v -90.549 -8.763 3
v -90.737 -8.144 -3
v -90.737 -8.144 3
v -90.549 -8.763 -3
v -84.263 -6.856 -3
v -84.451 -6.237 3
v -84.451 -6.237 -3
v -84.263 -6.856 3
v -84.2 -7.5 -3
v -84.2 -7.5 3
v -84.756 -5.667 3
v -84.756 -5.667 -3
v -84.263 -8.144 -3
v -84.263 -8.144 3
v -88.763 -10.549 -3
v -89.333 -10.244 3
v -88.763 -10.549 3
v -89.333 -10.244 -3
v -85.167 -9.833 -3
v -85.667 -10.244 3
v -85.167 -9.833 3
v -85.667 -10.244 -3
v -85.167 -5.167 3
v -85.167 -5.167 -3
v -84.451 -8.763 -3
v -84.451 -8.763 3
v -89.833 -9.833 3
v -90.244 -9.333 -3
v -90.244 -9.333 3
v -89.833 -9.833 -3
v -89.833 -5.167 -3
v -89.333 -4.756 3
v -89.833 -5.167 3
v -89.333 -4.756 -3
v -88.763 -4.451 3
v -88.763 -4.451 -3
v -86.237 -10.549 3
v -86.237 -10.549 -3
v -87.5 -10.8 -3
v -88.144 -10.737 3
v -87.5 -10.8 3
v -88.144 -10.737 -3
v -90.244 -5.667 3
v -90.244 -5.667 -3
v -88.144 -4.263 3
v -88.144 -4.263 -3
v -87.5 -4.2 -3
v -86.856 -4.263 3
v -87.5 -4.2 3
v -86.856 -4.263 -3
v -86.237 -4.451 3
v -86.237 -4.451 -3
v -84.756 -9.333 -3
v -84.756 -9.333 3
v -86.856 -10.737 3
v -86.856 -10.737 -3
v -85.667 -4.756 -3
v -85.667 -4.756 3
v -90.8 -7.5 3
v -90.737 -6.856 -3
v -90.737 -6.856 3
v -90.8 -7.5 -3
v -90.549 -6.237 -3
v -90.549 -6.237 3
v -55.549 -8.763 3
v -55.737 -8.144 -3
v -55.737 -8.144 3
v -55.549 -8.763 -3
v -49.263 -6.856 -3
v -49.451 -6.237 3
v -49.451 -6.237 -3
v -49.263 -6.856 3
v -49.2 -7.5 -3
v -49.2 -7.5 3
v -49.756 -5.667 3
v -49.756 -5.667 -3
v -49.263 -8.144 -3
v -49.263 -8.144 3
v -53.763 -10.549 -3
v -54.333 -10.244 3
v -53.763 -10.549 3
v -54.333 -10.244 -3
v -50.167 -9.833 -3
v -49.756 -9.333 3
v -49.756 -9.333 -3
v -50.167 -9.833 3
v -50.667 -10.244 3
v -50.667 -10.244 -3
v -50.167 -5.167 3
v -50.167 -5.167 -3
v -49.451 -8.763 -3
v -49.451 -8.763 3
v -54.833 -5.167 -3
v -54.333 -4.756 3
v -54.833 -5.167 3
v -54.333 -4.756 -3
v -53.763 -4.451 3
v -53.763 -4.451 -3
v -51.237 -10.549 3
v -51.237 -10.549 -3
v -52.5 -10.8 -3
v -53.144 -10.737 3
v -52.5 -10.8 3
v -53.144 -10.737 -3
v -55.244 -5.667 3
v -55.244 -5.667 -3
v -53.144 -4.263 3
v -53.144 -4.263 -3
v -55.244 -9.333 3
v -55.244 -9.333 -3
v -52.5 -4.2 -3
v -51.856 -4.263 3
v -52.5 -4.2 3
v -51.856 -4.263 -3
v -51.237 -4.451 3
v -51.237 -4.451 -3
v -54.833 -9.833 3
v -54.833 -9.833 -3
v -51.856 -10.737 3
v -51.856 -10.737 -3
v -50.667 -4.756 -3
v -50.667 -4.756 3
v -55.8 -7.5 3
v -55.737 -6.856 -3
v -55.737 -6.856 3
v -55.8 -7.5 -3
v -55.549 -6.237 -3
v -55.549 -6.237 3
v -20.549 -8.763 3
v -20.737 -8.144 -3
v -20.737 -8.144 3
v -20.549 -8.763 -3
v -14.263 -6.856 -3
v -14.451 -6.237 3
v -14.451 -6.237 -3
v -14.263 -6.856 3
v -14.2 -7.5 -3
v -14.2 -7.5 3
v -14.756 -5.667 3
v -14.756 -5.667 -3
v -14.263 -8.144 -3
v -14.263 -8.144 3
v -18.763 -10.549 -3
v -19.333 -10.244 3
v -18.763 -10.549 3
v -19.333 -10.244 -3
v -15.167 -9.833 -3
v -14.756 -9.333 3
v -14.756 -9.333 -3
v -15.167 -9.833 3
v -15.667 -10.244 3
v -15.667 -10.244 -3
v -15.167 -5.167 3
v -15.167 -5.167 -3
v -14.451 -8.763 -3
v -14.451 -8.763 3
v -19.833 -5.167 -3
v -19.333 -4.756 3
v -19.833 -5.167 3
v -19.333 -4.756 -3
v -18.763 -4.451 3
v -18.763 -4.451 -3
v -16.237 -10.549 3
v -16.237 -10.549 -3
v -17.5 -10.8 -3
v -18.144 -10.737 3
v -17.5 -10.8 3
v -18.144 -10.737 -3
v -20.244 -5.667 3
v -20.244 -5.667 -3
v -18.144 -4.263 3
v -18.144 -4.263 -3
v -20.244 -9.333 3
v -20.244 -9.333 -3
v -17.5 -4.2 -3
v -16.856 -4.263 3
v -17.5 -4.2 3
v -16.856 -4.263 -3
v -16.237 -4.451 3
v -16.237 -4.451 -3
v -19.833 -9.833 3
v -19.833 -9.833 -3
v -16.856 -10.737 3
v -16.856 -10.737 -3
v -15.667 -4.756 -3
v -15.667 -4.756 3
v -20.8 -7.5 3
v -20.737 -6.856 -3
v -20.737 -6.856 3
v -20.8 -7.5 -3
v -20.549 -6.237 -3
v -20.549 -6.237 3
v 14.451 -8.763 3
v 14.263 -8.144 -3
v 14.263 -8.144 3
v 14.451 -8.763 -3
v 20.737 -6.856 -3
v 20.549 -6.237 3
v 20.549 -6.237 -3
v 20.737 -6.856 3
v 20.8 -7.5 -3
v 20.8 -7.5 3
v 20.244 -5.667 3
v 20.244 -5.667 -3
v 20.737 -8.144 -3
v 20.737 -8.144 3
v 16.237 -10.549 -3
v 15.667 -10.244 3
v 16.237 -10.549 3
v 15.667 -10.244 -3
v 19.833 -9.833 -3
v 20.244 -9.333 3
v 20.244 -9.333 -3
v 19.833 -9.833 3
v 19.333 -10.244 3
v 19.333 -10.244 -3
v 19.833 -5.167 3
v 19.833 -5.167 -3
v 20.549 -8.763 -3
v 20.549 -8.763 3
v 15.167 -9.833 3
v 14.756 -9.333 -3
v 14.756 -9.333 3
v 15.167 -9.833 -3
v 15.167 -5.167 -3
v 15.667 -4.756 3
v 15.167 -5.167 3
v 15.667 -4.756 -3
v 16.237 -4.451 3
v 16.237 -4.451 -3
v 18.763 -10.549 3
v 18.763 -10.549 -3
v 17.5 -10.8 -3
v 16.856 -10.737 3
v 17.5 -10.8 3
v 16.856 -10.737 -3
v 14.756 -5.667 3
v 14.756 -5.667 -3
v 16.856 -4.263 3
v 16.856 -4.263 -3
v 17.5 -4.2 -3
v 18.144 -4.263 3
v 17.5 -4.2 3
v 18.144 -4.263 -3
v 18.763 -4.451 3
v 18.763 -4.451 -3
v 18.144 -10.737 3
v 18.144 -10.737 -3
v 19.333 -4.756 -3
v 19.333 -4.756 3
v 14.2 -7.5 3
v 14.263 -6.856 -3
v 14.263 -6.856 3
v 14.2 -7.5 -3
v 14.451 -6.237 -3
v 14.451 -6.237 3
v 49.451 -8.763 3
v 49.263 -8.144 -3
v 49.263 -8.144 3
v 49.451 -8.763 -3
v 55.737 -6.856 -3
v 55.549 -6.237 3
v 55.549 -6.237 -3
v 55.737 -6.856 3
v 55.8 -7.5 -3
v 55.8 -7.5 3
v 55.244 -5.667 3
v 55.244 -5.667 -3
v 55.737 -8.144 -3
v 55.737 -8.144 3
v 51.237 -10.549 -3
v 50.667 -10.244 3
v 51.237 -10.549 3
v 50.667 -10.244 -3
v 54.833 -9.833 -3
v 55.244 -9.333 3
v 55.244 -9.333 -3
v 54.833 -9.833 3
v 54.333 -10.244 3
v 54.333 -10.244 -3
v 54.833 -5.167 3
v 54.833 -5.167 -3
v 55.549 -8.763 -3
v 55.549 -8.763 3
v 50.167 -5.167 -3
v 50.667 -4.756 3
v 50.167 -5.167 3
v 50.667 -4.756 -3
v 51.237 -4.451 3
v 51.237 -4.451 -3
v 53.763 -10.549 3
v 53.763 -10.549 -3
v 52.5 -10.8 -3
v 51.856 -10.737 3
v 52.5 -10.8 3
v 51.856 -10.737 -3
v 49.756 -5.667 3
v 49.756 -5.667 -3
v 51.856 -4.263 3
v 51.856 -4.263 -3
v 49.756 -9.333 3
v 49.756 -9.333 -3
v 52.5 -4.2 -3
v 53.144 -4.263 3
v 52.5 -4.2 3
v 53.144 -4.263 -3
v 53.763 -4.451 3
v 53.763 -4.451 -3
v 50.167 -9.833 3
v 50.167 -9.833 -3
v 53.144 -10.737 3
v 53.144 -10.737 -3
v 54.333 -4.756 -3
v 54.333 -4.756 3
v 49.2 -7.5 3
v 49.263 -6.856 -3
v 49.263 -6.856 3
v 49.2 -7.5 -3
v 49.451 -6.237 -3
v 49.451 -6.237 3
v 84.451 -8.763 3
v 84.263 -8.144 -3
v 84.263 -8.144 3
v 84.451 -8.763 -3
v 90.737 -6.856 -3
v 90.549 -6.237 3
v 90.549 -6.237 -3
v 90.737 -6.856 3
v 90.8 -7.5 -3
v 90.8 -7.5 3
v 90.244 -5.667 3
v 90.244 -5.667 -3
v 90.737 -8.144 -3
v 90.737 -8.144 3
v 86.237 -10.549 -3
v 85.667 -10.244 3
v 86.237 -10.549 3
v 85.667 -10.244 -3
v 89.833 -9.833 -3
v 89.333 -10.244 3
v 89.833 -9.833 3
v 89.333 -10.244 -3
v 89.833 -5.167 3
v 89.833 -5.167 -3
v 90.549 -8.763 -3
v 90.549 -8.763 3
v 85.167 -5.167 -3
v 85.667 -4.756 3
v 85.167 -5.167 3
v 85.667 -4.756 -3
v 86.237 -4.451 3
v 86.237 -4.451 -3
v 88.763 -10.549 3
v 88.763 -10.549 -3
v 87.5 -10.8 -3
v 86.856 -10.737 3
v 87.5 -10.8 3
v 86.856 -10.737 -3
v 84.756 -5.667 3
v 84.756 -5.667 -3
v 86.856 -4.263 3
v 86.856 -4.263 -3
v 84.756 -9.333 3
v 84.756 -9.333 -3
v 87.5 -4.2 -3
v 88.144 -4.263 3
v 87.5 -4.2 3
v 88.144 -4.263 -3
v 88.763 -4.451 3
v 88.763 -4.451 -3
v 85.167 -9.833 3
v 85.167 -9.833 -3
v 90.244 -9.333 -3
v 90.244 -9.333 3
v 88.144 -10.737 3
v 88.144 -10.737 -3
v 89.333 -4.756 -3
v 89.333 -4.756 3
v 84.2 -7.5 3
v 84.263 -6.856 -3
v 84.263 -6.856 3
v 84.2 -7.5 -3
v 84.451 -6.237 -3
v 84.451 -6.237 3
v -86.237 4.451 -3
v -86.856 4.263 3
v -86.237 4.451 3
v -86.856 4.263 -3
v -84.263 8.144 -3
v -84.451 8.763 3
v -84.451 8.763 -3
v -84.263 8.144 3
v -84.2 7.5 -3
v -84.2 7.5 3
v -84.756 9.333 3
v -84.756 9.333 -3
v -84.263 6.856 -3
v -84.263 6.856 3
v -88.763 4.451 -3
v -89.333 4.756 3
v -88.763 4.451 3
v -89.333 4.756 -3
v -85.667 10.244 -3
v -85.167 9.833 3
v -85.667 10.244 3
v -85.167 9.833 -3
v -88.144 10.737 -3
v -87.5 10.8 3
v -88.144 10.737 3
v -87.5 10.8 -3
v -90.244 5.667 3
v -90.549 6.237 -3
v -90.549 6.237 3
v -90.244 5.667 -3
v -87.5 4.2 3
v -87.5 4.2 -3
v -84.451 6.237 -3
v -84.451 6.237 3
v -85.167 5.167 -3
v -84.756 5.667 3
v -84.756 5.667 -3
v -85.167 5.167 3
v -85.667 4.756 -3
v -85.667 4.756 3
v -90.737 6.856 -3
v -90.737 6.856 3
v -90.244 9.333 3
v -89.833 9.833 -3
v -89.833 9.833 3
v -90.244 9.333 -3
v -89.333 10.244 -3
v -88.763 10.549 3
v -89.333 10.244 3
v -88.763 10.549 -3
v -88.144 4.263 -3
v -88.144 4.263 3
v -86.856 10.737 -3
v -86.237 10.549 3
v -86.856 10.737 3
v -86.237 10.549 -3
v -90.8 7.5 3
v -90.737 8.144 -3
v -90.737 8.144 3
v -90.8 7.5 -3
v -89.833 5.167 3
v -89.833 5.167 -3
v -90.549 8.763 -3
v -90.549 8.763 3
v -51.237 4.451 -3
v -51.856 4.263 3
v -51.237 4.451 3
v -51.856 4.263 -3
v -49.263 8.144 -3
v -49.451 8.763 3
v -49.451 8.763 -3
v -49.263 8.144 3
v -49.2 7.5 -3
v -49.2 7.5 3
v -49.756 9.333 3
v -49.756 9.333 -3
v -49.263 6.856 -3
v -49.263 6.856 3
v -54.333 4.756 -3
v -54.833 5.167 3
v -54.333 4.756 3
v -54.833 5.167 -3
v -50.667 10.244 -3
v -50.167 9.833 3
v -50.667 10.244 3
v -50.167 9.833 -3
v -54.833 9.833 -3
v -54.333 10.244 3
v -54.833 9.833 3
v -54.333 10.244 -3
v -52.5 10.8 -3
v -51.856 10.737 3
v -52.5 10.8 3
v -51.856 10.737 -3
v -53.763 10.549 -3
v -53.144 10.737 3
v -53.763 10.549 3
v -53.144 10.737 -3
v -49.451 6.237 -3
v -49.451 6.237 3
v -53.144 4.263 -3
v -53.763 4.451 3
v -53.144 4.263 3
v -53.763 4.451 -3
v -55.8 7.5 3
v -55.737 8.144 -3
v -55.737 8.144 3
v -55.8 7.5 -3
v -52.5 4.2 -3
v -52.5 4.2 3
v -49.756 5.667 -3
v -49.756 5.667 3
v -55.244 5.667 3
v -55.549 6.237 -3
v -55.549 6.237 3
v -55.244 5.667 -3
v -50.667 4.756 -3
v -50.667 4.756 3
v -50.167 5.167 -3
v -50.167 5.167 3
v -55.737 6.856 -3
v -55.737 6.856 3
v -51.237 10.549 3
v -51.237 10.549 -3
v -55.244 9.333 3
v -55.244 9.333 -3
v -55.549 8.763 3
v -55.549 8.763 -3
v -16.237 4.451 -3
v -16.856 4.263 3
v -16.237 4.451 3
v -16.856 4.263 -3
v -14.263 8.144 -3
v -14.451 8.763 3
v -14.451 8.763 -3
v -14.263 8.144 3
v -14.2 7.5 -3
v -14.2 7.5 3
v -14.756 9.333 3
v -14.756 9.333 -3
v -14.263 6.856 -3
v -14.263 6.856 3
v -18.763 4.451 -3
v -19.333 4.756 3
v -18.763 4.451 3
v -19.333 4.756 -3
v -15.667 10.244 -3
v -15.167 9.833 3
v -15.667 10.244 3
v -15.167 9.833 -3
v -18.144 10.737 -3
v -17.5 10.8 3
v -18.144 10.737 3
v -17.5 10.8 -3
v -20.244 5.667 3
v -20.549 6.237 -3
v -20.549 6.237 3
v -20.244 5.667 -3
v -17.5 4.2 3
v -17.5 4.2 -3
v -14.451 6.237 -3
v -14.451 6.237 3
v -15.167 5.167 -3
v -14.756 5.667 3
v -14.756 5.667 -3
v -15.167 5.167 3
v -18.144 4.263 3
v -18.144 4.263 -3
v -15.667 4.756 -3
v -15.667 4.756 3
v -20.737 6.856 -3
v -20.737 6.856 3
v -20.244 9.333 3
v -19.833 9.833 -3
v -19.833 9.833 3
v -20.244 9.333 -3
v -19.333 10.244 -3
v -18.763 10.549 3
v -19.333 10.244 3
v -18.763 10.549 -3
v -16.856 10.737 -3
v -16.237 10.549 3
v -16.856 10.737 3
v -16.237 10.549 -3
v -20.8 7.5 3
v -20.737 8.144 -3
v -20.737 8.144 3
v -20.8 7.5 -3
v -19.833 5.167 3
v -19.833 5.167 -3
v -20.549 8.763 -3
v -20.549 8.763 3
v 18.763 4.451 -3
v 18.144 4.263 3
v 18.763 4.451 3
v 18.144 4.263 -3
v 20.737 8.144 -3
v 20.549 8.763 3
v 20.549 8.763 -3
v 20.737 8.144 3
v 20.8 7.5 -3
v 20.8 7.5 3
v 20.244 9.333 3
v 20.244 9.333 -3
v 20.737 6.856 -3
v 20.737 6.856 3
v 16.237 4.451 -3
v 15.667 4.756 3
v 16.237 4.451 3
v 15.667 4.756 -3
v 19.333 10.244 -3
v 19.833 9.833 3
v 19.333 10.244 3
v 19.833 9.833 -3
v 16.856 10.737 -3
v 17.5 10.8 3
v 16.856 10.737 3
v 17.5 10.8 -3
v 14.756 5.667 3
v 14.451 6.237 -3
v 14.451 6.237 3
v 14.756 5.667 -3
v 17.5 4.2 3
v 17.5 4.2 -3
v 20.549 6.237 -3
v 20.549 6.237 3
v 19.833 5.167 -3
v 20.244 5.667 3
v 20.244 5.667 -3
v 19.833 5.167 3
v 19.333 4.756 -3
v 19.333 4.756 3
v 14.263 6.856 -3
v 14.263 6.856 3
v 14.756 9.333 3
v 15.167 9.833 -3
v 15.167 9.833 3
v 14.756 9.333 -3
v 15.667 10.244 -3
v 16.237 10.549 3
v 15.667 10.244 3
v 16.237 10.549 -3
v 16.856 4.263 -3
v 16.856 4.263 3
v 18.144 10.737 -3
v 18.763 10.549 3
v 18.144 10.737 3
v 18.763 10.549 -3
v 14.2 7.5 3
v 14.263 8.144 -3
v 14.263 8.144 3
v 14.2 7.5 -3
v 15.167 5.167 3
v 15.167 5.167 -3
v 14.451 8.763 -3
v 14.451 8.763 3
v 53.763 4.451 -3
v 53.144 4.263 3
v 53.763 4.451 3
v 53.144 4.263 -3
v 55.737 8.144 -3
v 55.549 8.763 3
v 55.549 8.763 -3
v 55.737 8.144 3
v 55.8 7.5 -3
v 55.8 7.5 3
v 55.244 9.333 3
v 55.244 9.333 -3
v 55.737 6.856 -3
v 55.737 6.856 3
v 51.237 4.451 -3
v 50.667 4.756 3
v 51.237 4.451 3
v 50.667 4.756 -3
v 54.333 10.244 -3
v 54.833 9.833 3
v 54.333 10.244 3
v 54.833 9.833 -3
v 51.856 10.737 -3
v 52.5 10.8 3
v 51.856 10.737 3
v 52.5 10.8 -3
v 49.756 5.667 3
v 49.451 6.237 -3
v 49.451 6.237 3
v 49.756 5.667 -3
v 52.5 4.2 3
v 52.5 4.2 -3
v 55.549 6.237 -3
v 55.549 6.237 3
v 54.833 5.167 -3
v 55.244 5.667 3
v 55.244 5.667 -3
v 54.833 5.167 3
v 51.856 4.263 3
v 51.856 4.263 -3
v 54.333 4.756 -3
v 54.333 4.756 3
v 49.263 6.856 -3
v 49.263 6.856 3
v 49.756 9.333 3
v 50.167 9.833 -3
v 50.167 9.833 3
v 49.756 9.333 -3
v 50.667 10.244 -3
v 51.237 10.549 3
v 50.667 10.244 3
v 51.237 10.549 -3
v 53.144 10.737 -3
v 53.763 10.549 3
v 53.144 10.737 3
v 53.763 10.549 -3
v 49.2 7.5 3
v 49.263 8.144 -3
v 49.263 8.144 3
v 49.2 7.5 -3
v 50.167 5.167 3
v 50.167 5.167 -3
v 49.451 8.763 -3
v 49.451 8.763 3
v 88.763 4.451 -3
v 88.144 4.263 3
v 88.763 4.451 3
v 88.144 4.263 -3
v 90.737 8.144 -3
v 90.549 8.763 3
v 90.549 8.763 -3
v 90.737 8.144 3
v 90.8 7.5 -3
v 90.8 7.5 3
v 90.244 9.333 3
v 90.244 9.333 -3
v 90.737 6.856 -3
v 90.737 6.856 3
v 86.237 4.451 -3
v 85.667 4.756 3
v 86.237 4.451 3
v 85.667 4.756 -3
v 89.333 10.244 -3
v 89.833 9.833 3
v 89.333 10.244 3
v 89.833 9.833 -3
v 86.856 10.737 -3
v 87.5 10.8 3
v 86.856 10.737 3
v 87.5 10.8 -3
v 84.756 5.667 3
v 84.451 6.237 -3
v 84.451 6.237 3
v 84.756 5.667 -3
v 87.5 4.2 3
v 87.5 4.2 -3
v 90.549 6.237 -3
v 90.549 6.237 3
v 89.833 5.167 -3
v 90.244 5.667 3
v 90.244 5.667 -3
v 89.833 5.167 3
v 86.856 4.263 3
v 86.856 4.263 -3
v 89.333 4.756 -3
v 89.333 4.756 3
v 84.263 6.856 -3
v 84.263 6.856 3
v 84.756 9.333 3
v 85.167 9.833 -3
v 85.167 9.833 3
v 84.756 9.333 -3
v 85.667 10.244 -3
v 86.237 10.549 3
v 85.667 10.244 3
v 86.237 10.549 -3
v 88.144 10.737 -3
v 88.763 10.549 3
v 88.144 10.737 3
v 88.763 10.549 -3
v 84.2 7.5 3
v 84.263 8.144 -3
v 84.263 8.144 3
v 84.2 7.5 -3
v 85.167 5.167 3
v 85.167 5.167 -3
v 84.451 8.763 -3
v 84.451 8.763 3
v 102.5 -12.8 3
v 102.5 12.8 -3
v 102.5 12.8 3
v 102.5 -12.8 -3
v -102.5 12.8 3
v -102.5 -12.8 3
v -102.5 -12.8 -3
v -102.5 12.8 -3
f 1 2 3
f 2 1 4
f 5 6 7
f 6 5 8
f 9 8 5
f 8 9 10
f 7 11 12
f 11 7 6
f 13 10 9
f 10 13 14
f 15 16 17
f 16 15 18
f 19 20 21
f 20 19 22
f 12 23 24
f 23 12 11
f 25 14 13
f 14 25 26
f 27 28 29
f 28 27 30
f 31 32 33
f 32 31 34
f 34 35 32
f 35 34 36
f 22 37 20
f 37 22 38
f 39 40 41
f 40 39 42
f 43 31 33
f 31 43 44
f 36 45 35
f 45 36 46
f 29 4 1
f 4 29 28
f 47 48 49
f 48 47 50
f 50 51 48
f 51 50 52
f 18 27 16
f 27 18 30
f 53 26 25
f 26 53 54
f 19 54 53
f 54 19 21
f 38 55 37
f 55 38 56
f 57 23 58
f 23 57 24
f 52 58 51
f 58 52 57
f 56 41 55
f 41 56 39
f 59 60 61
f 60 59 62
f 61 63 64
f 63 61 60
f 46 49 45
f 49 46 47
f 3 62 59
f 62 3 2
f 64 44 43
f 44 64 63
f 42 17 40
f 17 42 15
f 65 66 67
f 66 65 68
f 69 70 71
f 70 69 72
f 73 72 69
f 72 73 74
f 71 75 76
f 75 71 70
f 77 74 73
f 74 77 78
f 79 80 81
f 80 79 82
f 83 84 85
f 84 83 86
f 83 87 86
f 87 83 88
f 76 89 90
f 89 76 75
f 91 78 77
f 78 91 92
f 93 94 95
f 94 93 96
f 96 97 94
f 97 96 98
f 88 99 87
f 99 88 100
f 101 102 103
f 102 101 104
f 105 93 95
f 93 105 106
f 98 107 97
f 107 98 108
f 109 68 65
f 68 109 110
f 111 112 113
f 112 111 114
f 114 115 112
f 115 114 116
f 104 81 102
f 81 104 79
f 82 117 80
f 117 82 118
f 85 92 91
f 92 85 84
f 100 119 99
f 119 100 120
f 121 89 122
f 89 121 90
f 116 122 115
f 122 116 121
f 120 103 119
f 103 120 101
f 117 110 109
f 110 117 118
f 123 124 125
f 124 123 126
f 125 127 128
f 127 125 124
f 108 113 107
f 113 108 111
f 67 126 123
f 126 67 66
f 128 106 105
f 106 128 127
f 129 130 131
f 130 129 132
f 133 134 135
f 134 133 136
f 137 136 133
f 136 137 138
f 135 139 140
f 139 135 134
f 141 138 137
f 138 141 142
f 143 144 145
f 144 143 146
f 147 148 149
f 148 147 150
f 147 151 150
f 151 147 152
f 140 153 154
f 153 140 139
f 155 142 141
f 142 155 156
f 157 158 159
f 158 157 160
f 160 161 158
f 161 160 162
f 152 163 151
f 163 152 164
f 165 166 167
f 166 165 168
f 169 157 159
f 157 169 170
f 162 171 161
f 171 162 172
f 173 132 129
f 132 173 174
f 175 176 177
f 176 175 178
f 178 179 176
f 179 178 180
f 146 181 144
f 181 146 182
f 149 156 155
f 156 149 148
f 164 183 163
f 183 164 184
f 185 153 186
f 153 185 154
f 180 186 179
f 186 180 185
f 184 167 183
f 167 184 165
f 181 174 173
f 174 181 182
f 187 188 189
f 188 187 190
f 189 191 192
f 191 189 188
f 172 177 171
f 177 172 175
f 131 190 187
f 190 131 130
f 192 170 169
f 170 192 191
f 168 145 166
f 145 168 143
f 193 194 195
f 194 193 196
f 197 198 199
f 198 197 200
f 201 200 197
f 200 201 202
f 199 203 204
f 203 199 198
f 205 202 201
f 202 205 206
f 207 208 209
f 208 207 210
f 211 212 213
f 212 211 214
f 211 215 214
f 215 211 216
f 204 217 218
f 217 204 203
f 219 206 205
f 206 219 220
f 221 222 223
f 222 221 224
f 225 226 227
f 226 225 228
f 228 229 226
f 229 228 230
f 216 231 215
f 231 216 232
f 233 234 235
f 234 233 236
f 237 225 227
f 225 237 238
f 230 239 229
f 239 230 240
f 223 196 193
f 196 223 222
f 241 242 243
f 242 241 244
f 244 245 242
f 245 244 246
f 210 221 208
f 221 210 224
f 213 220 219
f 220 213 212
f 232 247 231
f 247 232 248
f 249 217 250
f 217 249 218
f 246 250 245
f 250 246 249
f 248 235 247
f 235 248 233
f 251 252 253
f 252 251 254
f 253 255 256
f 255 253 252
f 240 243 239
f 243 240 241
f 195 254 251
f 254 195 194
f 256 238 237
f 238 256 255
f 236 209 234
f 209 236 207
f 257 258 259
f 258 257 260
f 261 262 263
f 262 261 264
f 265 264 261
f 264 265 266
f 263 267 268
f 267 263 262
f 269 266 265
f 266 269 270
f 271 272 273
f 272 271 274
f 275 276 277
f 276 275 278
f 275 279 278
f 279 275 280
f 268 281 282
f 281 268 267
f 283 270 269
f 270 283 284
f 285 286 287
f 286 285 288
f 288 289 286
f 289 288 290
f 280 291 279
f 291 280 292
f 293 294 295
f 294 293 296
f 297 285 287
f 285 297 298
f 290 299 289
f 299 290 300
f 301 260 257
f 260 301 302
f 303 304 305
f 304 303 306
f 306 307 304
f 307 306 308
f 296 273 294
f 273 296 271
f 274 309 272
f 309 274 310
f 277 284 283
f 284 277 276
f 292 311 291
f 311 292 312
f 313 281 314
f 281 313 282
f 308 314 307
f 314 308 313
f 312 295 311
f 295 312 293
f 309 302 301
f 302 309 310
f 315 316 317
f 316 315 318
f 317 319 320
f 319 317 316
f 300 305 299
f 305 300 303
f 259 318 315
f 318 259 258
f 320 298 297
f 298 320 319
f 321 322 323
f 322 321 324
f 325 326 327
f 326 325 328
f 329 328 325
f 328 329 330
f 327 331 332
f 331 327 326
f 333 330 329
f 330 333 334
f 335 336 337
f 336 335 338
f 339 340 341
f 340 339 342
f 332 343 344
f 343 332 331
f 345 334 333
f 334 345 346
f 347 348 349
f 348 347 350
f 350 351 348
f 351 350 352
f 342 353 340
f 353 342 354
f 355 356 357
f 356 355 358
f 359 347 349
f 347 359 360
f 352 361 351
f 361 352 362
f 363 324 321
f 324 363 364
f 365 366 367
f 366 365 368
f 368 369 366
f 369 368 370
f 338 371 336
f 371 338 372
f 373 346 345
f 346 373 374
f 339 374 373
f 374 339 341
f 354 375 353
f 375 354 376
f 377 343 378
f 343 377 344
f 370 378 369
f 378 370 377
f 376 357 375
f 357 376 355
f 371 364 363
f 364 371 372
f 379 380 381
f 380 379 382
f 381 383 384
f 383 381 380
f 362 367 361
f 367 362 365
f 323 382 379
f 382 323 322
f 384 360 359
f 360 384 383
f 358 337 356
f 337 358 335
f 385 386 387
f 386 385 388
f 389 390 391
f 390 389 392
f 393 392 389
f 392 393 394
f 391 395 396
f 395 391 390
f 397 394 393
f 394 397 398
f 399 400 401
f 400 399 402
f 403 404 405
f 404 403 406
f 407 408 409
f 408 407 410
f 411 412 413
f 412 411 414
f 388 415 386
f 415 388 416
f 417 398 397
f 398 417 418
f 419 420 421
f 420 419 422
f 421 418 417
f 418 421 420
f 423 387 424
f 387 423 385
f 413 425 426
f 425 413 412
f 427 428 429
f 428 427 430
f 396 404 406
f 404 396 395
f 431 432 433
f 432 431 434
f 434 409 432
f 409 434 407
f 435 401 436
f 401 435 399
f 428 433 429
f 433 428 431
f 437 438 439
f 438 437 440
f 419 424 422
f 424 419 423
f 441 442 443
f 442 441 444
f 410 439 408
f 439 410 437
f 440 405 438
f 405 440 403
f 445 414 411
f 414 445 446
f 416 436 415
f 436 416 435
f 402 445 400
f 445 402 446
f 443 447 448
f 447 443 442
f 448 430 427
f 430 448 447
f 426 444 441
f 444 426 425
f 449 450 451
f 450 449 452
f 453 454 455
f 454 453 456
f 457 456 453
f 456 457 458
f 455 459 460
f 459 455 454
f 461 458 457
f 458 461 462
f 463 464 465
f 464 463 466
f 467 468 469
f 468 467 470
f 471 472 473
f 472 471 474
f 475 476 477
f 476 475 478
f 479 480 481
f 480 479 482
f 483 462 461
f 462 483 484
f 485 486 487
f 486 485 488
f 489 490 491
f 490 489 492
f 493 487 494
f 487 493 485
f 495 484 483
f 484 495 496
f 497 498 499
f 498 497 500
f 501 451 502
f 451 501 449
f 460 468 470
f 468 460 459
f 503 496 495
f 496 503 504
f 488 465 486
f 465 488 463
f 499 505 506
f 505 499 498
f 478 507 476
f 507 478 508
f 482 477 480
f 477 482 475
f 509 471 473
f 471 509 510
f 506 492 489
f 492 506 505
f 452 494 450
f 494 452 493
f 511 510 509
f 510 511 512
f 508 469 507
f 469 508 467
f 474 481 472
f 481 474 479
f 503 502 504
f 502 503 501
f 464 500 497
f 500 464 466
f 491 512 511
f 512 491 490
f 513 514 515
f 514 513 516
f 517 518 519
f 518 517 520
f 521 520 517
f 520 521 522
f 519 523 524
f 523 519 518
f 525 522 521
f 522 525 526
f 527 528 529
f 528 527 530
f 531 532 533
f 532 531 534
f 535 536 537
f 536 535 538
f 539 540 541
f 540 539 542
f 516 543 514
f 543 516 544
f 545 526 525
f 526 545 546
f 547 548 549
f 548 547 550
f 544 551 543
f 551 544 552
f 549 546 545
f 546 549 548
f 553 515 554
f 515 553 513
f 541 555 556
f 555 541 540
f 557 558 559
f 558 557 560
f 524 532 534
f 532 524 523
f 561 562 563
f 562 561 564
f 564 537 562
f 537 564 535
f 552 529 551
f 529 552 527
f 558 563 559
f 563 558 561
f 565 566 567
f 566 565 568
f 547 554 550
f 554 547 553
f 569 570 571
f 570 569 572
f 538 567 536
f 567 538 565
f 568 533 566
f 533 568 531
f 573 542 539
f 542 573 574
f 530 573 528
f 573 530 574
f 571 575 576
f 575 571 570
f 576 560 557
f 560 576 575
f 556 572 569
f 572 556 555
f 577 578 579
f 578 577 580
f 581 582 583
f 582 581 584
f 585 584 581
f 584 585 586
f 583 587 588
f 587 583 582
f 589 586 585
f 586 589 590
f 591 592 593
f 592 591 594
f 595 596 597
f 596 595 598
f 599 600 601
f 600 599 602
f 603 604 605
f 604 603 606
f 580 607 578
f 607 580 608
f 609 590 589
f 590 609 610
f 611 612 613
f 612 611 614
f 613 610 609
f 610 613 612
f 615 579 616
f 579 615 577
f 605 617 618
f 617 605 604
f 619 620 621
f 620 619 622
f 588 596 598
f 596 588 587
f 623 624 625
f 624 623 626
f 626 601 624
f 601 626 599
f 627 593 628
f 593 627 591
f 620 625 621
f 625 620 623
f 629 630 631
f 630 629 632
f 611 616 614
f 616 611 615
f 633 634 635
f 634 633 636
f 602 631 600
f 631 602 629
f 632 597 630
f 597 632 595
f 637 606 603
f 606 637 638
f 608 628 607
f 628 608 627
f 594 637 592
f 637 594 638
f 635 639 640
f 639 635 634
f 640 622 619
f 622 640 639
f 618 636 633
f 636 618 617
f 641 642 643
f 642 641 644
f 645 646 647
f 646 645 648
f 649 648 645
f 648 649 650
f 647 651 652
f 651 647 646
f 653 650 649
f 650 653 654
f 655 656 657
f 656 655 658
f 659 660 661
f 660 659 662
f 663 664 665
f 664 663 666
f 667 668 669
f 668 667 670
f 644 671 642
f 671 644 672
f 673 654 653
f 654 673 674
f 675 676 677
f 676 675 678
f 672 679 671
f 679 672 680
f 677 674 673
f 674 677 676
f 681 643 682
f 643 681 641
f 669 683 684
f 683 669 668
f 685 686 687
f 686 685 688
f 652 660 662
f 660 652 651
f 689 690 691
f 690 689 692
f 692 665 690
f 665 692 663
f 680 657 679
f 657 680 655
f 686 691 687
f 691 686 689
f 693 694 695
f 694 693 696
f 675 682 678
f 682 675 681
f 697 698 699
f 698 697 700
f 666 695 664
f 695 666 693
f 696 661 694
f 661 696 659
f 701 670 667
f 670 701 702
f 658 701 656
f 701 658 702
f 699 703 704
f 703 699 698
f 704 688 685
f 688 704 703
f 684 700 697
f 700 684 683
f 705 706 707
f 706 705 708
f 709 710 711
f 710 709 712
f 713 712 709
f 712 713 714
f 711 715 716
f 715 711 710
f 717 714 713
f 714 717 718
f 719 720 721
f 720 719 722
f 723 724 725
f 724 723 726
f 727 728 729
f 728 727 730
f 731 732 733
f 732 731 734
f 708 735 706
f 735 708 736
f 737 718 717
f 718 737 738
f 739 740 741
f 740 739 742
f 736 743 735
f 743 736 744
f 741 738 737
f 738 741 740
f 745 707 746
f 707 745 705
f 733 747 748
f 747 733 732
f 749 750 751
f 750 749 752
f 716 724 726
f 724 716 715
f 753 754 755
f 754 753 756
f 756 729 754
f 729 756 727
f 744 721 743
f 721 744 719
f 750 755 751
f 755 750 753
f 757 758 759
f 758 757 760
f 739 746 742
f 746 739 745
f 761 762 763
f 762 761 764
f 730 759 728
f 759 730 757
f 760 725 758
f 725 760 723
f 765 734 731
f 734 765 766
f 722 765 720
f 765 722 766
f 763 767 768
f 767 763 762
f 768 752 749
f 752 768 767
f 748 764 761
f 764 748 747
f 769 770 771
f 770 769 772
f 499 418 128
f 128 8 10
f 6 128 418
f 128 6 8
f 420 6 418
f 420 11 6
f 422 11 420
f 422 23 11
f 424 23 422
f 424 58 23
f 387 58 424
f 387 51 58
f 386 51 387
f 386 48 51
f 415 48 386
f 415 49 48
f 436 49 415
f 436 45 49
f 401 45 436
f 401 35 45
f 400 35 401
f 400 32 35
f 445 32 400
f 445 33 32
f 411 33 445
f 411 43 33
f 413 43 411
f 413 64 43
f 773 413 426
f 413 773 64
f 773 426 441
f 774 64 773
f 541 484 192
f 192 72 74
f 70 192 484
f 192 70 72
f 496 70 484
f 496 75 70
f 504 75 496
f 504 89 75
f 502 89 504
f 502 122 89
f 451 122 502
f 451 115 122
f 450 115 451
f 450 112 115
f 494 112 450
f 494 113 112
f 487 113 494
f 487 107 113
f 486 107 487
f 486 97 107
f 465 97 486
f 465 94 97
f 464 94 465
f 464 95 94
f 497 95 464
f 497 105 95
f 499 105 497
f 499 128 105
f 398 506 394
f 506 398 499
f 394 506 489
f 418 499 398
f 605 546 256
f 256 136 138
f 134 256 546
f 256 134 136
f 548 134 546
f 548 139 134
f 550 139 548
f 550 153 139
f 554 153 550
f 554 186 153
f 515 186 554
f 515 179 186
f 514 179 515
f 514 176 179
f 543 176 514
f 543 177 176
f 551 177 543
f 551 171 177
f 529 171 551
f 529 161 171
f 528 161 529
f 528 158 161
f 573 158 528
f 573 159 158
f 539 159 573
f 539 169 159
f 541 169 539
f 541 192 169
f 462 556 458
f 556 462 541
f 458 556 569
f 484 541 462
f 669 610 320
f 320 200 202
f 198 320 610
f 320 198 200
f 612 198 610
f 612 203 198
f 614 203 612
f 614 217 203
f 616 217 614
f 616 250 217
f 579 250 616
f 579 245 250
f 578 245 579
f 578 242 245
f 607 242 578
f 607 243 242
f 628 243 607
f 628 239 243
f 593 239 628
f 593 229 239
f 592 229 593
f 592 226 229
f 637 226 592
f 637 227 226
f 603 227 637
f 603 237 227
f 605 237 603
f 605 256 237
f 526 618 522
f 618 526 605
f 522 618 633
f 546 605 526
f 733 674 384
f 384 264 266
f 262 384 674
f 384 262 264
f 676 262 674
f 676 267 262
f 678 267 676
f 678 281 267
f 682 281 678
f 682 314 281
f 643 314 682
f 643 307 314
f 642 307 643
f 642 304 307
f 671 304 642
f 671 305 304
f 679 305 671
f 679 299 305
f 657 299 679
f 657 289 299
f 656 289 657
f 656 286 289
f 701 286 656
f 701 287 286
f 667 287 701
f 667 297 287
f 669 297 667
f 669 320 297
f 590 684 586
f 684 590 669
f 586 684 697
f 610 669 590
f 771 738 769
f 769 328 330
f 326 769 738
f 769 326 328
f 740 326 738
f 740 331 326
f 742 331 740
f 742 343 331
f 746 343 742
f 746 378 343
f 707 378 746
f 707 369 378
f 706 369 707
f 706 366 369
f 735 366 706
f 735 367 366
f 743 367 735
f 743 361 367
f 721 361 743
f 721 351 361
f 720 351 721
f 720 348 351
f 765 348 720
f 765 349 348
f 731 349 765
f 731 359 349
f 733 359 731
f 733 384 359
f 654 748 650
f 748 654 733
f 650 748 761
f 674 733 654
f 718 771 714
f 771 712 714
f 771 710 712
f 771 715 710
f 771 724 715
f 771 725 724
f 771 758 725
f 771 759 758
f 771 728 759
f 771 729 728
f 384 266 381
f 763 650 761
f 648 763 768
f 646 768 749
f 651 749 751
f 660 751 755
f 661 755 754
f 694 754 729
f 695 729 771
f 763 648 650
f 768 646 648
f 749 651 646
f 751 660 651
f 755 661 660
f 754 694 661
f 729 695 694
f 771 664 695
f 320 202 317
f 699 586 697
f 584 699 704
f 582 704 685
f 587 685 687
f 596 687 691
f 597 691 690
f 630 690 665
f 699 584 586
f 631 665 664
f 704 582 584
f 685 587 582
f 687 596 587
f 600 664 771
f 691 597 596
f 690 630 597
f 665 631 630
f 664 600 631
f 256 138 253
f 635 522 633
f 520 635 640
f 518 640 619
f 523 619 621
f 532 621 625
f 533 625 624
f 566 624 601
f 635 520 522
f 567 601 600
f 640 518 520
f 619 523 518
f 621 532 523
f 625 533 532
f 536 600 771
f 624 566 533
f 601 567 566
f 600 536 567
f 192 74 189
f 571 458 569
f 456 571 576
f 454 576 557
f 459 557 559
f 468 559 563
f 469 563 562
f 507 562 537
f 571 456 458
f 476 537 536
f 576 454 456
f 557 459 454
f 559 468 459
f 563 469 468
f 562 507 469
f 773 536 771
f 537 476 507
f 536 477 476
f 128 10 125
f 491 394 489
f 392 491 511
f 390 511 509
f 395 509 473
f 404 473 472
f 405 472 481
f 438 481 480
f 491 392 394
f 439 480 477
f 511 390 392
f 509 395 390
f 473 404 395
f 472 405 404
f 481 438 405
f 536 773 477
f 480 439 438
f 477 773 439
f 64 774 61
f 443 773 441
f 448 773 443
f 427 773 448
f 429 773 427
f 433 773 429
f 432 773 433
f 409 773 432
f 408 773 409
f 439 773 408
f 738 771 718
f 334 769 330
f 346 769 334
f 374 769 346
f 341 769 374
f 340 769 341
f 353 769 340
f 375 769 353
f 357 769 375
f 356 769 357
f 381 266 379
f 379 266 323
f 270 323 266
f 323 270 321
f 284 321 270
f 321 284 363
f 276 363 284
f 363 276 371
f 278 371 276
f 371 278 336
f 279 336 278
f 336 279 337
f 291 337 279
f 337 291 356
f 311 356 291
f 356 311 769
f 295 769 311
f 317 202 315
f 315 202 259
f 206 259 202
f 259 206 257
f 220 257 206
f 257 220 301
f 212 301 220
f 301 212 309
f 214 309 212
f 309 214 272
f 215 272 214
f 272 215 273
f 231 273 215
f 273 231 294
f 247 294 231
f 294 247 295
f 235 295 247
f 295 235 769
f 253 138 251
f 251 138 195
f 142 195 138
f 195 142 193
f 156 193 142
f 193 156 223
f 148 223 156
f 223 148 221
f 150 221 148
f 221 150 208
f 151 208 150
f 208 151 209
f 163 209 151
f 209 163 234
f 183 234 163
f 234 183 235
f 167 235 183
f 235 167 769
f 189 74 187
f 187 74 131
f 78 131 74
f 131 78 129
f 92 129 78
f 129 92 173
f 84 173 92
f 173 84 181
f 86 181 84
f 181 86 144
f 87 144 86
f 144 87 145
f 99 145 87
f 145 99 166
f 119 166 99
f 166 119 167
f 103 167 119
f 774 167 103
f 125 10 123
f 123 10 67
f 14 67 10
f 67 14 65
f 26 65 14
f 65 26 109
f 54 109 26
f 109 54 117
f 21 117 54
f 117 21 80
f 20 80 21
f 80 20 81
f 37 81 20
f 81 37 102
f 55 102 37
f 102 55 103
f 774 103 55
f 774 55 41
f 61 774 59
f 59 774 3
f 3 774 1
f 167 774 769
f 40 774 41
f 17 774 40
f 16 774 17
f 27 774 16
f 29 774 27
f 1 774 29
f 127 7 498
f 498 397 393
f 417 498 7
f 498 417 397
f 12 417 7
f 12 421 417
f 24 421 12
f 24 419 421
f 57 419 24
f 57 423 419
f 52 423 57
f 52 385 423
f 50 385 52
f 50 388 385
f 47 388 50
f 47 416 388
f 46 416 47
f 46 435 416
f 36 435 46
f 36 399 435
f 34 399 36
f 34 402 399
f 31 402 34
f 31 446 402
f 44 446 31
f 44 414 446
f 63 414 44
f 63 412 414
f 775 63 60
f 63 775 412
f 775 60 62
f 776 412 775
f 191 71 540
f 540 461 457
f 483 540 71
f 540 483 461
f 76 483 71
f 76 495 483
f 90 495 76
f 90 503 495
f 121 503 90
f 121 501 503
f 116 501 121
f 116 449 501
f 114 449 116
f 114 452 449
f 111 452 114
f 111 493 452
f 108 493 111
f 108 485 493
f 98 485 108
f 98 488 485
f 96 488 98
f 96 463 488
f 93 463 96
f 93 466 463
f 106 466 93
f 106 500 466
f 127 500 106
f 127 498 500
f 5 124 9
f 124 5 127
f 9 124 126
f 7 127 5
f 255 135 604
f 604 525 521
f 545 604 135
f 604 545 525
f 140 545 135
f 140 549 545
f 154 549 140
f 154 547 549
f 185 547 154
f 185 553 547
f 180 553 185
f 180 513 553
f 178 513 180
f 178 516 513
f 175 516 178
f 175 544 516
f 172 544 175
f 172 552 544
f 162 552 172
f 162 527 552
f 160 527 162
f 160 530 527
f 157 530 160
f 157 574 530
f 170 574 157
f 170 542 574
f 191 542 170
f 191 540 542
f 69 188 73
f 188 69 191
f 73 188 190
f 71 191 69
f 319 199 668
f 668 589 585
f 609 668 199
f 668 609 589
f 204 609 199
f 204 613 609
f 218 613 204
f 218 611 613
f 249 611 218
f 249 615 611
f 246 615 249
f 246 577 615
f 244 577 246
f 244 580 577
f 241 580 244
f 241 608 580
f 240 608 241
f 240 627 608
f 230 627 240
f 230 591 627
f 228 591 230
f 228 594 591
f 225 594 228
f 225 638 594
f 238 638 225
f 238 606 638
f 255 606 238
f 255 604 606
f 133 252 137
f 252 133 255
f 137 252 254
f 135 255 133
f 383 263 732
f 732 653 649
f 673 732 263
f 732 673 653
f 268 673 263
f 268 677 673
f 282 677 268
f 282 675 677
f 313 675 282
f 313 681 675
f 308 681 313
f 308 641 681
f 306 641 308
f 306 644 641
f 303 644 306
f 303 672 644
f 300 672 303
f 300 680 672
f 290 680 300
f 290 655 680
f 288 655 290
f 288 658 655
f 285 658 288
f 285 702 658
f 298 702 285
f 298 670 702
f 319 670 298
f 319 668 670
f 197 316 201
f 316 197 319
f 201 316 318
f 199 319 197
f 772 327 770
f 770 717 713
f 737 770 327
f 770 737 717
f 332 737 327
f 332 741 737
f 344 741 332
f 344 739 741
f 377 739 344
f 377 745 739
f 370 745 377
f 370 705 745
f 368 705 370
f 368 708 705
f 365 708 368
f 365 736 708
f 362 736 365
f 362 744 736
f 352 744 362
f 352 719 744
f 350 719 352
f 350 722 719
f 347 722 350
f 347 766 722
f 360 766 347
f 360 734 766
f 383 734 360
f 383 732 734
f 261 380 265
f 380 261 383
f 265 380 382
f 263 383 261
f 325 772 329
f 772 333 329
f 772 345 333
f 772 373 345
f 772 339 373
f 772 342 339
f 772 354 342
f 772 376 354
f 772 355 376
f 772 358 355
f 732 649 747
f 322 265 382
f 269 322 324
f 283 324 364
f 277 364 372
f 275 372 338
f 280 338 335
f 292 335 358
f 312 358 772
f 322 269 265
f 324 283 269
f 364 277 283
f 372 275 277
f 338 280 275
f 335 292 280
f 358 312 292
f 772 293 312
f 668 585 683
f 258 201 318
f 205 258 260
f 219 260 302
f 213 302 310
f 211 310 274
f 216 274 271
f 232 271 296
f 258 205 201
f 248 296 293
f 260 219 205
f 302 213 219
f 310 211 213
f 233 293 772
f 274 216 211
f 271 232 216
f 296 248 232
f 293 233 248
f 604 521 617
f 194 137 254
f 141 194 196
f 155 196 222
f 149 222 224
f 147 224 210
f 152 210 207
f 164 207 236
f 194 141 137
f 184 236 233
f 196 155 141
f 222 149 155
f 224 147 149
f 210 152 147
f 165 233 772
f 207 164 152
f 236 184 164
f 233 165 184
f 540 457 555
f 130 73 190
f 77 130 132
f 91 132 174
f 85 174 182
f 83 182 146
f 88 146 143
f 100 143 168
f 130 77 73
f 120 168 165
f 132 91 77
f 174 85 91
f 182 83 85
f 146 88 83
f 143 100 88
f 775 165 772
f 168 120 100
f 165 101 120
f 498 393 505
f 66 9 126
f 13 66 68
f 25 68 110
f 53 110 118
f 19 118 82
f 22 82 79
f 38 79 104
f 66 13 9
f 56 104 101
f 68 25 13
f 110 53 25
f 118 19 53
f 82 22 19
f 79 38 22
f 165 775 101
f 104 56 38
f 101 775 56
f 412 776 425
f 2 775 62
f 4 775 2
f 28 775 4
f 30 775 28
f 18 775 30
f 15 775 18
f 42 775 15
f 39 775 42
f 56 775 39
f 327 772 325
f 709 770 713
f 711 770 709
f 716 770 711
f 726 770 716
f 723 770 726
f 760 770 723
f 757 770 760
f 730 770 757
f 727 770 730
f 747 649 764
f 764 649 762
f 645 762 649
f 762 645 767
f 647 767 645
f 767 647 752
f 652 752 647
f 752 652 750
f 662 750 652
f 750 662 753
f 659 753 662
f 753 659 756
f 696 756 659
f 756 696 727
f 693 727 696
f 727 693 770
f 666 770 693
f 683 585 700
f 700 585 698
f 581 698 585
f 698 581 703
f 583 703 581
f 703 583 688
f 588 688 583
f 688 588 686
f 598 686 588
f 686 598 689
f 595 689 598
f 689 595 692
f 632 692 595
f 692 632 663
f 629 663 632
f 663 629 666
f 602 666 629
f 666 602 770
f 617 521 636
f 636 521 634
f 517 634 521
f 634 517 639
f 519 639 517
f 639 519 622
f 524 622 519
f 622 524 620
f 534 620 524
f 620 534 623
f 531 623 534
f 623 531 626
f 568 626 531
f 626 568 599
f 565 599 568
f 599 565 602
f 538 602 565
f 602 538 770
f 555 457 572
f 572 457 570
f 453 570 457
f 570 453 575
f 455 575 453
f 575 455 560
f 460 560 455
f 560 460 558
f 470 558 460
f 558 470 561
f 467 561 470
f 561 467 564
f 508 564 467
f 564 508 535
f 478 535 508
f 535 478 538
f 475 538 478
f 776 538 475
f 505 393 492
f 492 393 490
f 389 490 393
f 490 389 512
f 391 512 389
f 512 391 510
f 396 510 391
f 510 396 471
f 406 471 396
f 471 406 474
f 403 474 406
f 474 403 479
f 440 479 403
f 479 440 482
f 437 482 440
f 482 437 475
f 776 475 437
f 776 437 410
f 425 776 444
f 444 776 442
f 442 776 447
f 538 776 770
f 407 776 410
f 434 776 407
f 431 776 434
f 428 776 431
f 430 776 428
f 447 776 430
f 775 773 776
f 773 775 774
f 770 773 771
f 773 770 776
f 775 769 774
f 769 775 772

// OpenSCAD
$fn = 32;

// ----------------------------------------------------------------------
// Hole bar, 6 x Ø6.6
// tworows layout, 15 mm edge offset
// ----------------------------------------------------------------------

// --- parameters (mm) ---
bar_w = 25.6;     // bar width (Y)
bar_t = 6;        // bar thickness (Z)
holes = 6;        // holes per row
hole_d = 6.6;     // hole diameter
edge = 15;        // offset from the bar end to the first hole
pitch = 35;       // pitch between neighbouring holes
row_offset = 15;  // distance between the two rows

// --- derived feature positions (mm) ---
span = (holes - 1) * pitch;   // = 175   distance between the end holes
bar_l = span + 2 * edge;      // = 205   overall bar length
start_x = -bar_l / 2 + edge;  // = -87.5   X of the first hole
feature_centers = [
  [start_x + 0 * pitch, -row_offset / 2],
  [start_x + 1 * pitch, -row_offset / 2],
  [start_x + 2 * pitch, -row_offset / 2],
  [start_x + 3 * pitch, -row_offset / 2],
  [start_x + 4 * pitch, -row_offset / 2],
  [start_x + 5 * pitch, -row_offset / 2]
];   // hole centres of the first row
row2_centers = [
  [start_x + 0 * pitch, row_offset / 2],
  [start_x + 1 * pitch, row_offset / 2],
  [start_x + 2 * pitch, row_offset / 2],
  [start_x + 3 * pitch, row_offset / 2],
  [start_x + 4 * pitch, row_offset / 2],
  [start_x + 5 * pitch, row_offset / 2]
];   // hole centres of the second row

// bar with two rows of holes, both read from their own centre arrays
difference() {
  translate([-bar_l / 2, -bar_w / 2, -bar_t / 2]) cube([bar_l, bar_w, bar_t]);
  for (centre = feature_centers)
    translate([centre[0], centre[1], 0])
      cylinder(d = hole_d, h = bar_t + 2, center = true);
  for (centre = row2_centers)
    translate([centre[0], centre[1], 0])
      cylinder(d = hole_d, h = bar_t + 2, center = true);
}
